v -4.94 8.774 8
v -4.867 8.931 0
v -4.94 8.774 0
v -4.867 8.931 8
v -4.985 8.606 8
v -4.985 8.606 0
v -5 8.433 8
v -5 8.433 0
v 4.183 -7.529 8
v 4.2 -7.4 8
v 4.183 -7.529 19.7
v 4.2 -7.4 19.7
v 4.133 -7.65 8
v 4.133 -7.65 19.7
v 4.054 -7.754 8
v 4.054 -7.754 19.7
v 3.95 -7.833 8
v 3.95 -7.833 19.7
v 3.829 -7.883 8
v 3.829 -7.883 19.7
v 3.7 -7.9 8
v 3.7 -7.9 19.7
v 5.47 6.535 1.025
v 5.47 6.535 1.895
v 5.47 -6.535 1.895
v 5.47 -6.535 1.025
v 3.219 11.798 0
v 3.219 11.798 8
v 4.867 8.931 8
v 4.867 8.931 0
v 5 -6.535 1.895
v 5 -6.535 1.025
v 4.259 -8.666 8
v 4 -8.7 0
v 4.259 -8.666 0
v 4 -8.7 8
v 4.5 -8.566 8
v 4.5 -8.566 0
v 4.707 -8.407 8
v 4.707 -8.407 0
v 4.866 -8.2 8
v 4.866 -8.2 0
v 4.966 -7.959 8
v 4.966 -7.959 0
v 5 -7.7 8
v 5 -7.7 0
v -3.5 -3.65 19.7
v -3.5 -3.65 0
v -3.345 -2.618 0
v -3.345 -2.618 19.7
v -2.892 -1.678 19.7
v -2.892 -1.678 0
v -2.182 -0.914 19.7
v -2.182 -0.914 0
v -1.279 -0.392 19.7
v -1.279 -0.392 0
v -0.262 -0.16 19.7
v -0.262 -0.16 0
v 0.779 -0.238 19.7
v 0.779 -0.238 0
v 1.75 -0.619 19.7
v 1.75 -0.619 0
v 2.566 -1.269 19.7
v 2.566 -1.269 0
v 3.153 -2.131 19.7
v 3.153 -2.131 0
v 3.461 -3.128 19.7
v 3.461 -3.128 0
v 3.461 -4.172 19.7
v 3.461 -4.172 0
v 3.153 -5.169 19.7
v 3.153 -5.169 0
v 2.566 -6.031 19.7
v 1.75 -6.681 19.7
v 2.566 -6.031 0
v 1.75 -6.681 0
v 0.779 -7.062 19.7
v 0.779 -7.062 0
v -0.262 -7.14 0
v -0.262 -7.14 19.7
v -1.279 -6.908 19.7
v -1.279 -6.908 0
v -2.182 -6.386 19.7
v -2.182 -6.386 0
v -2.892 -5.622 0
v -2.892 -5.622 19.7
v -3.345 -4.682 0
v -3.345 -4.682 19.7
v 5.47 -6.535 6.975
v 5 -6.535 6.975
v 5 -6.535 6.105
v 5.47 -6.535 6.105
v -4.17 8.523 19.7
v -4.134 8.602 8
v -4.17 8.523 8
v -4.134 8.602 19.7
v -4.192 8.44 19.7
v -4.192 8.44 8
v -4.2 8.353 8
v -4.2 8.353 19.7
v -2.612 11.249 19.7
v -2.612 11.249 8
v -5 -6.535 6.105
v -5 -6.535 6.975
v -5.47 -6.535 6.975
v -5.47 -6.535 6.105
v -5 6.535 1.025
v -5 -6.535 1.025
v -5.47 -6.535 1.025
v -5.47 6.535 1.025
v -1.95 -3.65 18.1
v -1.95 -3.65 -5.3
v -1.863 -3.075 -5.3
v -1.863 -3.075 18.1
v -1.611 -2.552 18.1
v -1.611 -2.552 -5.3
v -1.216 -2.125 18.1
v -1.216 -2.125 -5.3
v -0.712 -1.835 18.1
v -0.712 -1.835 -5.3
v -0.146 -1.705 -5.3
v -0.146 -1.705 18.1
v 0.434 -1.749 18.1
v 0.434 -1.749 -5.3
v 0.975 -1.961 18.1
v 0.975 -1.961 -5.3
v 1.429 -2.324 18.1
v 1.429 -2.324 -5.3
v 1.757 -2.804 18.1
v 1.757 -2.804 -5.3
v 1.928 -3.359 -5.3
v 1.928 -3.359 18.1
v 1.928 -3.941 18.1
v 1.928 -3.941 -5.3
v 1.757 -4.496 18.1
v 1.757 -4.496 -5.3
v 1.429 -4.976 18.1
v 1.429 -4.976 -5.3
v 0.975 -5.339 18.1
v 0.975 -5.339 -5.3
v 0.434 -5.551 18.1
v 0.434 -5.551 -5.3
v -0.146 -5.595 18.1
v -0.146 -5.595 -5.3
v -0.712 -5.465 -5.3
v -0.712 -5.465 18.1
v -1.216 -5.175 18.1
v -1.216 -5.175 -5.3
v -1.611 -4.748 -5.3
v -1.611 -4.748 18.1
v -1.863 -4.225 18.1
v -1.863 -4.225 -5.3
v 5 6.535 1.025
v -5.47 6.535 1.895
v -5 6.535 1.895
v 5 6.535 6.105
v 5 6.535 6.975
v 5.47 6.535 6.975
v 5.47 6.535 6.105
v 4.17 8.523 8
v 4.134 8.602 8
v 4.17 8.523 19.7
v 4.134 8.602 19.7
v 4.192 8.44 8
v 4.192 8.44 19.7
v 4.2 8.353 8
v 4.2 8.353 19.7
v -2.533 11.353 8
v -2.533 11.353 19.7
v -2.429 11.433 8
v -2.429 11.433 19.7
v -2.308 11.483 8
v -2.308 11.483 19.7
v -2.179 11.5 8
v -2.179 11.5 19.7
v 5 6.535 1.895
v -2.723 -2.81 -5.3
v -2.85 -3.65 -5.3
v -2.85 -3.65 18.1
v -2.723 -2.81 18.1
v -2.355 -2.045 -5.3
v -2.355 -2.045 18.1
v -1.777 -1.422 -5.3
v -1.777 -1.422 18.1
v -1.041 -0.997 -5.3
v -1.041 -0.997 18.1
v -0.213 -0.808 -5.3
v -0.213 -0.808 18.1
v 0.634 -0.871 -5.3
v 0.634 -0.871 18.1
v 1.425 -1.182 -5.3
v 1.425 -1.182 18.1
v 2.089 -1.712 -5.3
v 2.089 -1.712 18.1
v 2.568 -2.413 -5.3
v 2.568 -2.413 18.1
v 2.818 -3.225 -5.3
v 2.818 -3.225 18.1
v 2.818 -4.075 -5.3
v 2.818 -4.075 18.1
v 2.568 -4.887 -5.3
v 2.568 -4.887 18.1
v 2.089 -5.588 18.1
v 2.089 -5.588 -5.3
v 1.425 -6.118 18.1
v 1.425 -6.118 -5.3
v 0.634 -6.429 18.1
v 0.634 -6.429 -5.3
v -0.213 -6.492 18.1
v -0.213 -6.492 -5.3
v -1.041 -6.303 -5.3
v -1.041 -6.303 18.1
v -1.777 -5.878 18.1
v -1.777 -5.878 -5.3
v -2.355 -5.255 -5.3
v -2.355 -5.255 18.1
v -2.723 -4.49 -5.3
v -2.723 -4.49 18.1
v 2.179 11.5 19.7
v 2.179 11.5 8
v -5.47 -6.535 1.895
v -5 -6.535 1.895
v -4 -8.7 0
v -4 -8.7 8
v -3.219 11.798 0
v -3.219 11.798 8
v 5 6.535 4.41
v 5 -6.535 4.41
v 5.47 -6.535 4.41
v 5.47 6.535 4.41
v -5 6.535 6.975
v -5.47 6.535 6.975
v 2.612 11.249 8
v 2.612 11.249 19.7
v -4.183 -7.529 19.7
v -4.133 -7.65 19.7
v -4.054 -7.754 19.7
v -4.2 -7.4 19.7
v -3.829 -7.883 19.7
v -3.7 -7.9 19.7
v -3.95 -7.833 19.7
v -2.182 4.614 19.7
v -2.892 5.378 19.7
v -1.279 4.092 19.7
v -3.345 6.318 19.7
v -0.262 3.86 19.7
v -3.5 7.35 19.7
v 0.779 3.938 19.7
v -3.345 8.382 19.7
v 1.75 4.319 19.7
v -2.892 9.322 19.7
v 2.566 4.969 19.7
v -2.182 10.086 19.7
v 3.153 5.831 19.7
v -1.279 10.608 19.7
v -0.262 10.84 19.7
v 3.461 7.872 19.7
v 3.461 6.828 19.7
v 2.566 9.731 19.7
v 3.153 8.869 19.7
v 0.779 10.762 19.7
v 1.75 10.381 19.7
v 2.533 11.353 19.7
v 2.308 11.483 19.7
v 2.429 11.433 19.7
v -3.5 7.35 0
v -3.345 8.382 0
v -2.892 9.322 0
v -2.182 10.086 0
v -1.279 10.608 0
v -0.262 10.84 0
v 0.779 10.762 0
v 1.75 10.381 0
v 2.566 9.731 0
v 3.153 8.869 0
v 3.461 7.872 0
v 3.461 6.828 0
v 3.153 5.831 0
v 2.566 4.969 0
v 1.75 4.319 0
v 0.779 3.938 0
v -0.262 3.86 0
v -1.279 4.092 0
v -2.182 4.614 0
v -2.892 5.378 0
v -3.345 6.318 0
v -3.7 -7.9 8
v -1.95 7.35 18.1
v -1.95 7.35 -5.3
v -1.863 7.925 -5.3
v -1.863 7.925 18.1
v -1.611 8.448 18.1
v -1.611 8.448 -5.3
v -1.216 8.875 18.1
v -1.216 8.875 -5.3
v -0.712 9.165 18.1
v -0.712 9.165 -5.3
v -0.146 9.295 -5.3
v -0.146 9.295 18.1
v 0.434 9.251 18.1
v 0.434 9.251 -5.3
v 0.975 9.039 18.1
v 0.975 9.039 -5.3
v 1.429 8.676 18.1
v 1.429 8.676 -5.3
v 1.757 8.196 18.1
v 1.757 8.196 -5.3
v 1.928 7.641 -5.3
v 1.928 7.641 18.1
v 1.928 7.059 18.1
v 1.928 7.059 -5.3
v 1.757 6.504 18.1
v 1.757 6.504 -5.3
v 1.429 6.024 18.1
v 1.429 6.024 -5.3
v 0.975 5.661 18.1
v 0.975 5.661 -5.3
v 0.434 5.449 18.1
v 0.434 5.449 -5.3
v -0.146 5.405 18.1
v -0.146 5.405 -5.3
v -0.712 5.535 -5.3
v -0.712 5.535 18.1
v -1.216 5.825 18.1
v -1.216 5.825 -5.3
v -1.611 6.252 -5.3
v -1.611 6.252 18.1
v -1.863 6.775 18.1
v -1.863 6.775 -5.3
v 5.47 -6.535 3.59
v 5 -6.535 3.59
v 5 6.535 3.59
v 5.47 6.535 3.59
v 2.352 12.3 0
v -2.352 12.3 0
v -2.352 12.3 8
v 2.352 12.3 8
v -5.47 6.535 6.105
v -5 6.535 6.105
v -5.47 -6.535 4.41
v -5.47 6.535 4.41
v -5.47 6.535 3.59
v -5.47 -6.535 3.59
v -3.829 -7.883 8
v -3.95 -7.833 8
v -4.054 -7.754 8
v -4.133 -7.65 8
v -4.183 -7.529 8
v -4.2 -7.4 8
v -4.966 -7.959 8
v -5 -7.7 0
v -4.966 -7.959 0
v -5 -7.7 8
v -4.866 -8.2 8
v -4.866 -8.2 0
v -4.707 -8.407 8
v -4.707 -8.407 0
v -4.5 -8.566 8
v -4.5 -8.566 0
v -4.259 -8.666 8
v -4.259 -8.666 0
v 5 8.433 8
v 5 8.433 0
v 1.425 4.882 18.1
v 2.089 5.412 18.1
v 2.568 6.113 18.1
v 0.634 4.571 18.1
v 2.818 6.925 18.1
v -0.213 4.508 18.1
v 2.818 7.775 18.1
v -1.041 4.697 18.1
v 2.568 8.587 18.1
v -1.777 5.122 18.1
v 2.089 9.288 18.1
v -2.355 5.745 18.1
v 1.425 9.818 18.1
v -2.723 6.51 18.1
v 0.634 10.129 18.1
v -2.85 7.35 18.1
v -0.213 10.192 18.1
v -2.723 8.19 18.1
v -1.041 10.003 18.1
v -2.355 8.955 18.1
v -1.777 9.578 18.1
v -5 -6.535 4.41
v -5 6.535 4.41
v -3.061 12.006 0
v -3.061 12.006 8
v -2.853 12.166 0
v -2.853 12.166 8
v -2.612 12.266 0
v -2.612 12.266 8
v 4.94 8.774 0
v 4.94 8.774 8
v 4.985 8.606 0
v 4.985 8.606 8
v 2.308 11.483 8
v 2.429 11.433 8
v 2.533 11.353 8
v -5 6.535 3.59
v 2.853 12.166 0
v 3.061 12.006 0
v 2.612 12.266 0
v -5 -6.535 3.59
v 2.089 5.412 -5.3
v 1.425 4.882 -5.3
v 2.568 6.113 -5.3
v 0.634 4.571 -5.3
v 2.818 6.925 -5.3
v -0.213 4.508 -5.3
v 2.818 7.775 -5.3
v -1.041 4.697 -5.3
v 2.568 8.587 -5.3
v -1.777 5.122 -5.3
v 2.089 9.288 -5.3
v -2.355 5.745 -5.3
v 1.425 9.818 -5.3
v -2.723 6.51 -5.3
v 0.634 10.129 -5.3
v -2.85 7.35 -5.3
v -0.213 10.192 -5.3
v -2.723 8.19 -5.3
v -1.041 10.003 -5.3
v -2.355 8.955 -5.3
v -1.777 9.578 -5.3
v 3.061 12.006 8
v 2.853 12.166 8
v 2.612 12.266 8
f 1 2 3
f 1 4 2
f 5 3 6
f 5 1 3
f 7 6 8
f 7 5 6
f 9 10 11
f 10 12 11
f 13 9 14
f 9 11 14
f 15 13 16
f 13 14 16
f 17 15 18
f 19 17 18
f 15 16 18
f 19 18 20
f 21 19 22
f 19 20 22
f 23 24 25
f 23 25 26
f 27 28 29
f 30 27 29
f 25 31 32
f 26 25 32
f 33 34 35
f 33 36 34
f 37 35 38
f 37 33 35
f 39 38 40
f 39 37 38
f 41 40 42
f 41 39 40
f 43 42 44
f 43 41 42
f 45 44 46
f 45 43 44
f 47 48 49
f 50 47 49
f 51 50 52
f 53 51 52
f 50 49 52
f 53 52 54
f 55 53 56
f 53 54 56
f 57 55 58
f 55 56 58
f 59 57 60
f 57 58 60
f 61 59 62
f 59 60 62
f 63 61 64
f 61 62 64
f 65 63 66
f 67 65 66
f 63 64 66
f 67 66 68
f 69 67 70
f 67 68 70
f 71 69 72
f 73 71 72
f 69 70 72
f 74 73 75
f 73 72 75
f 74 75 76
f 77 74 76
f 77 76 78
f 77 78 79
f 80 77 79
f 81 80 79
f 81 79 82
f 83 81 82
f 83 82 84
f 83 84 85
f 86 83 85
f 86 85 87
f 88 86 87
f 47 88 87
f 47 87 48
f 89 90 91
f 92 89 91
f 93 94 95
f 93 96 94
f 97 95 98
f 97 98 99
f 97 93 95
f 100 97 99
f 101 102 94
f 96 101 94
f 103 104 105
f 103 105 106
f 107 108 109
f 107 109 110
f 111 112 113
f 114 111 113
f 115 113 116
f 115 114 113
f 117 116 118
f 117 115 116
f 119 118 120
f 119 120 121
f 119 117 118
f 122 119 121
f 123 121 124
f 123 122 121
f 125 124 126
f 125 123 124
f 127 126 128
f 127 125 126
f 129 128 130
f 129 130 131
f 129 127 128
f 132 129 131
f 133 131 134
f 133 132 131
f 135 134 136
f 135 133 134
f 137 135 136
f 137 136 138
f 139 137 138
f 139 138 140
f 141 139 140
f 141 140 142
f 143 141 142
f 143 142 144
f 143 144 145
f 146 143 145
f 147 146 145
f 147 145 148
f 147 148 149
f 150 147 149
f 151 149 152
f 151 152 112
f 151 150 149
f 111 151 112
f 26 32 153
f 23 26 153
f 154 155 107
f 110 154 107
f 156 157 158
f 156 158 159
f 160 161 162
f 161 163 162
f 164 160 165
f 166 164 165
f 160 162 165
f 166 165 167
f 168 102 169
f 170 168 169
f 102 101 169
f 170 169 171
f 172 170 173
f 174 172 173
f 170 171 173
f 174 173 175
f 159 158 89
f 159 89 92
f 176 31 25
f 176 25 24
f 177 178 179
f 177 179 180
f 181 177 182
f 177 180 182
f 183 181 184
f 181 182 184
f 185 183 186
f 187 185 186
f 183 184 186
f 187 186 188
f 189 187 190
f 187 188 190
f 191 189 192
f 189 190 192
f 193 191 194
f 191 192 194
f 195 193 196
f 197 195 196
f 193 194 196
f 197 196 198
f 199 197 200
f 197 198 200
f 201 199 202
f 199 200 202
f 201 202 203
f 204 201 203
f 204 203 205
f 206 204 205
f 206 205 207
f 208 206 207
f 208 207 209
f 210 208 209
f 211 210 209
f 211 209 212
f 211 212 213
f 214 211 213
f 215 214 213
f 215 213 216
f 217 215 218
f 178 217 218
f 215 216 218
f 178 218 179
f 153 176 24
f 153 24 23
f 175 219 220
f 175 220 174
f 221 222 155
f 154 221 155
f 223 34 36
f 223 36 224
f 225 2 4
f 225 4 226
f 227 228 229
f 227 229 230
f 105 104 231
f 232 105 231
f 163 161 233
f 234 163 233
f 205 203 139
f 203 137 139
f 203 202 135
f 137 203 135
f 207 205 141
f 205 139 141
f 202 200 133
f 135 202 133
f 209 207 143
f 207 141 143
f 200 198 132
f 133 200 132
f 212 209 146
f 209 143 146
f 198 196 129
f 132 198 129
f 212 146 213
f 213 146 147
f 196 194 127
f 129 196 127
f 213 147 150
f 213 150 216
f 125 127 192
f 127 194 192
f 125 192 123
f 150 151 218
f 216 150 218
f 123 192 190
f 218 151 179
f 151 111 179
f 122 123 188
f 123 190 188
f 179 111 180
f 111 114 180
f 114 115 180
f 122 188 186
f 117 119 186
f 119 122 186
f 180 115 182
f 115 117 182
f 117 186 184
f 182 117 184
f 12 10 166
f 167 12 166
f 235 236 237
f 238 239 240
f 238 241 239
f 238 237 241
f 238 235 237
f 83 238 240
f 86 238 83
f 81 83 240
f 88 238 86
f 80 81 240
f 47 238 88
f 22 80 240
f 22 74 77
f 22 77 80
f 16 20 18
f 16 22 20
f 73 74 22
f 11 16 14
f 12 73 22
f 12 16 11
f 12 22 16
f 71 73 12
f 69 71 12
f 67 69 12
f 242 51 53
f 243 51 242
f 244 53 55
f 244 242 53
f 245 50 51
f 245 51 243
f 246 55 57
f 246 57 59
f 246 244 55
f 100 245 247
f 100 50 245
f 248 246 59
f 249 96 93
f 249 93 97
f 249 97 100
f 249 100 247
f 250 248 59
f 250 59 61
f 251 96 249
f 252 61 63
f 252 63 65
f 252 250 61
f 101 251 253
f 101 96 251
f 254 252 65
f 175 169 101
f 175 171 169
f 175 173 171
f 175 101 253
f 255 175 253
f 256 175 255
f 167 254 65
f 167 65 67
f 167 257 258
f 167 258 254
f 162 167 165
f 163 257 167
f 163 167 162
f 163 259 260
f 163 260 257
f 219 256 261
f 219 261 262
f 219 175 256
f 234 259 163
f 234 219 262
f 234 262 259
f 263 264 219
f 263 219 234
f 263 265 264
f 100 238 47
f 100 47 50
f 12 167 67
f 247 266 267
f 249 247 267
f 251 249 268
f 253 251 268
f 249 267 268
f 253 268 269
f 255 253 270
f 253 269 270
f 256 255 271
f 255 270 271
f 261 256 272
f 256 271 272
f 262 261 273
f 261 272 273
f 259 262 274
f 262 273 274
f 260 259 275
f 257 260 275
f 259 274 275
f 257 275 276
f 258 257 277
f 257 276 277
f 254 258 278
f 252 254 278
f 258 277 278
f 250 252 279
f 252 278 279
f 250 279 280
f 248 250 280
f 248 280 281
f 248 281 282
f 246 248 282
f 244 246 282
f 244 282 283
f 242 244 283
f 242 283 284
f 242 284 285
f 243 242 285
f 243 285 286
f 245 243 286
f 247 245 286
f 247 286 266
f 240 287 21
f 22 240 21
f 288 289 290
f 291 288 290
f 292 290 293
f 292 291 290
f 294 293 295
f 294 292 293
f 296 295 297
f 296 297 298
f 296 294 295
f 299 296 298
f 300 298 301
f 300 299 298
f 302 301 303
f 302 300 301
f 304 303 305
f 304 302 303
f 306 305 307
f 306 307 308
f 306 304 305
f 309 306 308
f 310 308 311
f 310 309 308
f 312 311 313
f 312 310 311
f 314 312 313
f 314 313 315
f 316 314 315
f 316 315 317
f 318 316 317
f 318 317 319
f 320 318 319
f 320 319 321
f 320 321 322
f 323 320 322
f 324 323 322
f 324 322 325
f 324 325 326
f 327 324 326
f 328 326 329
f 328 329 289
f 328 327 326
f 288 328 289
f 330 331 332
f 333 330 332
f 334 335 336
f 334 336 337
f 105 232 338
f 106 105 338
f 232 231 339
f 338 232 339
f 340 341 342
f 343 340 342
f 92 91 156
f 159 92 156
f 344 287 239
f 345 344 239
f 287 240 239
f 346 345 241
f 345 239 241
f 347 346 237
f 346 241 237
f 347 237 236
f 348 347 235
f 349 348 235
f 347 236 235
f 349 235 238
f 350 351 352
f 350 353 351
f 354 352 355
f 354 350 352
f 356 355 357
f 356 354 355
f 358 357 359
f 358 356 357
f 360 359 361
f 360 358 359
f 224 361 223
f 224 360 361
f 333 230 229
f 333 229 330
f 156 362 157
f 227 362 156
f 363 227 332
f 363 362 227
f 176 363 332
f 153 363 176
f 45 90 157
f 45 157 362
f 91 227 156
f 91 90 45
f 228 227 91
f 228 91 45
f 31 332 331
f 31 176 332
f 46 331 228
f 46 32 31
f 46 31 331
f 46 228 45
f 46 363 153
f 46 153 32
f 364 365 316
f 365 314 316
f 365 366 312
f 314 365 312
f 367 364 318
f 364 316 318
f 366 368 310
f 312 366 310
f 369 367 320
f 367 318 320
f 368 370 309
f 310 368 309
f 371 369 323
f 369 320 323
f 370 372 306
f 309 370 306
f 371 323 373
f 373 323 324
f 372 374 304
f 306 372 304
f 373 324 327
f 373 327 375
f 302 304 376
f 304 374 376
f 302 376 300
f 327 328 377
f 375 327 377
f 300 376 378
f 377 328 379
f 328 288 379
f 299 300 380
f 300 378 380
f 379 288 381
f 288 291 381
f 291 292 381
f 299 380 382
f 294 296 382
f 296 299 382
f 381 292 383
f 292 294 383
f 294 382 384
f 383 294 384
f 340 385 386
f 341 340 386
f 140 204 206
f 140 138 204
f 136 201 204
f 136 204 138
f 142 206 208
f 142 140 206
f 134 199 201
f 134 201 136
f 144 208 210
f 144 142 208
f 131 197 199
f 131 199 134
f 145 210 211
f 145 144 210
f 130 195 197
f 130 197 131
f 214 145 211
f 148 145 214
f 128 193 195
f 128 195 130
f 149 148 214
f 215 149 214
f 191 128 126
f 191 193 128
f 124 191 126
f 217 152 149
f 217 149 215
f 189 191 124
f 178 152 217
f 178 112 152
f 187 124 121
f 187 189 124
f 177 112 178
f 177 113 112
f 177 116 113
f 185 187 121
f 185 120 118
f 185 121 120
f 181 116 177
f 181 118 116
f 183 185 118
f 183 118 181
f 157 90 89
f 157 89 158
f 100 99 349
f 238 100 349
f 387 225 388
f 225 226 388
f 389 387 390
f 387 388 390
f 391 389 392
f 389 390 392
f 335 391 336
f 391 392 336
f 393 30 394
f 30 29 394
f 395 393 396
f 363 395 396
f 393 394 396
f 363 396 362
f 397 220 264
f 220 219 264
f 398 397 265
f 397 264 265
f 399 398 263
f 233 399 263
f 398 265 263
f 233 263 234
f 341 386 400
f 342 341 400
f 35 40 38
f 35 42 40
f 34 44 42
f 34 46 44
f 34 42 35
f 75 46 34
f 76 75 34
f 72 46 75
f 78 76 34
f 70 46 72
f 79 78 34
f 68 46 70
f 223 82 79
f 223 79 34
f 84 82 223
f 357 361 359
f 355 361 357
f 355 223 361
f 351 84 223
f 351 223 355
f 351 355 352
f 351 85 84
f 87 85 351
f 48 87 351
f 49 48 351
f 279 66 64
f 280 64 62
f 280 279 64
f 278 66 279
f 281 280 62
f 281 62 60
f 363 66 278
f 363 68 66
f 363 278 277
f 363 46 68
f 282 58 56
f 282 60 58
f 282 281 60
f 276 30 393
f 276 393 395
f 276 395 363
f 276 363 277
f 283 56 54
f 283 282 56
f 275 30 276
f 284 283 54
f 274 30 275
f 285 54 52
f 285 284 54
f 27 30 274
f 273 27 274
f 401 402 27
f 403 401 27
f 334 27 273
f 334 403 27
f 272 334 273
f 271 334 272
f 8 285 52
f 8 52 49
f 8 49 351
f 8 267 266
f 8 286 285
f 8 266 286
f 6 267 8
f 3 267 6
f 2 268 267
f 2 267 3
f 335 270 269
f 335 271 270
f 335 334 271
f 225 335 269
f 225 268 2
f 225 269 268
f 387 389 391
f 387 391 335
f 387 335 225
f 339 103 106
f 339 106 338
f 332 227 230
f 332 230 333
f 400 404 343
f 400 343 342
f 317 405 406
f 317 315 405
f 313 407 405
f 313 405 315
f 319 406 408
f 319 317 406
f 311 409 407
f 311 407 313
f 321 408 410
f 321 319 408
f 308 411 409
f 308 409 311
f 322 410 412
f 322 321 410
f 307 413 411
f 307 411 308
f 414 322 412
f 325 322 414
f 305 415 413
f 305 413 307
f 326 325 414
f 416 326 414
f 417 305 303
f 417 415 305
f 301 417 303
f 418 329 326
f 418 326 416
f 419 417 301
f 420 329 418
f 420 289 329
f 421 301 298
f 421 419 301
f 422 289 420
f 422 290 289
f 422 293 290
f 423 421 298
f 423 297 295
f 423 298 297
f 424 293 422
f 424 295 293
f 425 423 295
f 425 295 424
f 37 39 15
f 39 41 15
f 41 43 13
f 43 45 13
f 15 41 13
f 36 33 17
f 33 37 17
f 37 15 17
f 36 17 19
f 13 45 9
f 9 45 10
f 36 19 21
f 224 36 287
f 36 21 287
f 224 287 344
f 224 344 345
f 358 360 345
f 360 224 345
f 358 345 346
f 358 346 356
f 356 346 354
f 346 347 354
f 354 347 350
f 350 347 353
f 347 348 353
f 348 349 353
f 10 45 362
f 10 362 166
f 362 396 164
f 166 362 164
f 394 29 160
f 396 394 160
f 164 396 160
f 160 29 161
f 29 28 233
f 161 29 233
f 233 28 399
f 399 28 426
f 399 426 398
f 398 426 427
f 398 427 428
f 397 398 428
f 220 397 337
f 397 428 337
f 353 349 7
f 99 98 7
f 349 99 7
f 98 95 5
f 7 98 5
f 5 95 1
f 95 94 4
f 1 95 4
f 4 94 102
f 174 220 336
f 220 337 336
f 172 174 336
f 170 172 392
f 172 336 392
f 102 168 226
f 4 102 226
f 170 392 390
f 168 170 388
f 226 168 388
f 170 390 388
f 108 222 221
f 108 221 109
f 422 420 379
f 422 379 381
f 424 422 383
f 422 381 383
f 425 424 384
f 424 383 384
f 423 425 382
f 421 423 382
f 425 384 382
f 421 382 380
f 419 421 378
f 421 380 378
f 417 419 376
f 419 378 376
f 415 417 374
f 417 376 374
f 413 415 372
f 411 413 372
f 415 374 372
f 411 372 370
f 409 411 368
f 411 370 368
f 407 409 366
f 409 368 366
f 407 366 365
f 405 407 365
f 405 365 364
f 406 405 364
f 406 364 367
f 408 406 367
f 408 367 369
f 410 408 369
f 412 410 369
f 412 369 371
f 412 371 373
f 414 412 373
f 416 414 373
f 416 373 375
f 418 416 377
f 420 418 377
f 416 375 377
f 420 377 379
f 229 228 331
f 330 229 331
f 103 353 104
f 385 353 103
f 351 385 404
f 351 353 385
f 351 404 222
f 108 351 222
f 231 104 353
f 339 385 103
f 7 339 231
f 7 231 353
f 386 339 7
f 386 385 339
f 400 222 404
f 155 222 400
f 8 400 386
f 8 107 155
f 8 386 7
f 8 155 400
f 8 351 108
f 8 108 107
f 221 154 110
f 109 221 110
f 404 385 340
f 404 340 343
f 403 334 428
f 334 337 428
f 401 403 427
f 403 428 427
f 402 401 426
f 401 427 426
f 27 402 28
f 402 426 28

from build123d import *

# Parameters (mm, degrees)
BOSS_EXTRUDE1_DEPTH        = 8
BOSS_EXTRUDE2_DEPTH        = 11.7
SKETCH3_R                  = 3.5
CUT_EXTRUDE1_DEPTH         = 24.75668327
EXTRUDE_THIN1_DEPTH        = 5.3
EXTRUDE_THIN1_DEPTH_BACK   = 18.1
SKETCH4_R                  = 2.85
SKETCH4_R_2                = 1.95
EXTRUDE_THIN1_2_DEPTH      = 5.3
EXTRUDE_THIN1_2_DEPTH_BACK = 18.1
SKETCH5_W                  = 0.82
SKETCH5_H                  = 13.07
SKETCH5_W_2                = 0.87
BOSS_EXTRUDE3_DEPTH        = 0.47
FILLET1_R                  = 1
FILLET2_R                  = 0.5


with BuildPart() as part:
    # Sketch1 → Boss-Extrude1 (new body)
    with BuildSketch(Plane.XY):
        Polygon((-5, 8.7), (-2.931034483, 12.3), (2.931034483, 12.3), (5, 8.7), (5, -8.7), (-5, -8.7), align=None)
    extrude(amount=BOSS_EXTRUDE1_DEPTH)

    # Sketch2 → Boss-Extrude2 (add)
    with BuildSketch(Plane.XY.offset(8)):
        Polygon((-4.2, 8.486489489), (-4.2, -7.9), (4.2, -7.9), (4.2, 8.486489489), (2.468097408, 11.5), (-2.468097408, 11.5), align=None)
    extrude(amount=BOSS_EXTRUDE2_DEPTH)

    # Sketch3 → Cut-Extrude1 (cut, through all)
    with BuildSketch(Plane(origin=(0, 0, 0), x_dir=(-1, 0, 0), z_dir=(0, 0, -1))):
        with Locations((0, -3.65)):
            Circle(SKETCH3_R)
        with Locations((0, 7.35)):
            Circle(SKETCH3_R)
    extrude(amount=-CUT_EXTRUDE1_DEPTH, mode=Mode.SUBTRACT)

    # Sketch5 → Boss-Extrude3 (add)
    with BuildSketch(Plane(origin=(5, 0, 0), x_dir=(0, 0, -1), z_dir=(1, 0, 0))):
        with Locations((-4, 0)):
            Rectangle(SKETCH5_W, SKETCH5_H)
        with Locations((-6.54, 0)):
            Rectangle(SKETCH5_W_2, SKETCH5_H)
        with Locations((-1.46, 0)):
            Rectangle(SKETCH5_W_2, SKETCH5_H)
    boss_extrude3 = extrude(amount=BOSS_EXTRUDE3_DEPTH)

    # Mirror1: Boss-Extrude3 across plane
    add(boss_extrude3.mirror(Plane(origin=(0, 0, 0), x_dir=(0, 0, 1), z_dir=(1, 0, 0))))

    # Fillet1
    fillet1_edges = [part.edges().sort_by_distance(p)[0] for p in [
        (5, -8.7, 4),
        (-5, -8.7, 4),
        (-5, 8.7, 4),
        (-2.931034483, 12.3, 4),
        (2.931034483, 12.3, 4),
        (5, 8.7, 4),
    ]]
    fillet(fillet1_edges, radius=FILLET1_R)

    # Fillet2
    fillet2_edges = [part.edges().sort_by_distance(p)[0] for p in [
        (-2.468097408, 11.5, 13.85),
        (-4.2, 8.486489489, 13.85),
        (-4.2, -7.9, 13.85),
        (4.2, -7.9, 13.85),
        (4.2, 8.486489489, 13.85),
        (2.468097408, 11.5, 13.85),
    ]]
    fillet(fillet2_edges, radius=FILLET2_R)


with BuildPart() as body_2:
    # Sketch4 → Extrude-Thin1 (new, two sides: drawn at the far end of the back side and taken through both)
    with BuildSketch(Plane(origin=(0, 0, 0), x_dir=(-1, 0, 0), z_dir=(0, 0, -1)).offset(-EXTRUDE_THIN1_DEPTH_BACK)):
        with Locations((0, 7.35)):
            Circle(SKETCH4_R)
        with Locations((0, 7.35)):
            Circle(SKETCH4_R_2, mode=Mode.SUBTRACT)
    extrude(amount=EXTRUDE_THIN1_DEPTH + EXTRUDE_THIN1_DEPTH_BACK)


with BuildPart() as body_3:
    # Sketch4 → Extrude-Thin1 2 (new, two sides: drawn at the far end of the back side and taken through both)
    with BuildSketch(Plane(origin=(0, 0, 0), x_dir=(-1, 0, 0), z_dir=(0, 0, -1)).offset(-EXTRUDE_THIN1_2_DEPTH_BACK)):
        with Locations((0, -3.65)):
            Circle(SKETCH4_R)
        with Locations((0, -3.65)):
            Circle(SKETCH4_R_2, mode=Mode.SUBTRACT)
    extrude(amount=EXTRUDE_THIN1_2_DEPTH + EXTRUDE_THIN1_2_DEPTH_BACK)


solid = Compound([part.part, body_2.part, body_3.part])
